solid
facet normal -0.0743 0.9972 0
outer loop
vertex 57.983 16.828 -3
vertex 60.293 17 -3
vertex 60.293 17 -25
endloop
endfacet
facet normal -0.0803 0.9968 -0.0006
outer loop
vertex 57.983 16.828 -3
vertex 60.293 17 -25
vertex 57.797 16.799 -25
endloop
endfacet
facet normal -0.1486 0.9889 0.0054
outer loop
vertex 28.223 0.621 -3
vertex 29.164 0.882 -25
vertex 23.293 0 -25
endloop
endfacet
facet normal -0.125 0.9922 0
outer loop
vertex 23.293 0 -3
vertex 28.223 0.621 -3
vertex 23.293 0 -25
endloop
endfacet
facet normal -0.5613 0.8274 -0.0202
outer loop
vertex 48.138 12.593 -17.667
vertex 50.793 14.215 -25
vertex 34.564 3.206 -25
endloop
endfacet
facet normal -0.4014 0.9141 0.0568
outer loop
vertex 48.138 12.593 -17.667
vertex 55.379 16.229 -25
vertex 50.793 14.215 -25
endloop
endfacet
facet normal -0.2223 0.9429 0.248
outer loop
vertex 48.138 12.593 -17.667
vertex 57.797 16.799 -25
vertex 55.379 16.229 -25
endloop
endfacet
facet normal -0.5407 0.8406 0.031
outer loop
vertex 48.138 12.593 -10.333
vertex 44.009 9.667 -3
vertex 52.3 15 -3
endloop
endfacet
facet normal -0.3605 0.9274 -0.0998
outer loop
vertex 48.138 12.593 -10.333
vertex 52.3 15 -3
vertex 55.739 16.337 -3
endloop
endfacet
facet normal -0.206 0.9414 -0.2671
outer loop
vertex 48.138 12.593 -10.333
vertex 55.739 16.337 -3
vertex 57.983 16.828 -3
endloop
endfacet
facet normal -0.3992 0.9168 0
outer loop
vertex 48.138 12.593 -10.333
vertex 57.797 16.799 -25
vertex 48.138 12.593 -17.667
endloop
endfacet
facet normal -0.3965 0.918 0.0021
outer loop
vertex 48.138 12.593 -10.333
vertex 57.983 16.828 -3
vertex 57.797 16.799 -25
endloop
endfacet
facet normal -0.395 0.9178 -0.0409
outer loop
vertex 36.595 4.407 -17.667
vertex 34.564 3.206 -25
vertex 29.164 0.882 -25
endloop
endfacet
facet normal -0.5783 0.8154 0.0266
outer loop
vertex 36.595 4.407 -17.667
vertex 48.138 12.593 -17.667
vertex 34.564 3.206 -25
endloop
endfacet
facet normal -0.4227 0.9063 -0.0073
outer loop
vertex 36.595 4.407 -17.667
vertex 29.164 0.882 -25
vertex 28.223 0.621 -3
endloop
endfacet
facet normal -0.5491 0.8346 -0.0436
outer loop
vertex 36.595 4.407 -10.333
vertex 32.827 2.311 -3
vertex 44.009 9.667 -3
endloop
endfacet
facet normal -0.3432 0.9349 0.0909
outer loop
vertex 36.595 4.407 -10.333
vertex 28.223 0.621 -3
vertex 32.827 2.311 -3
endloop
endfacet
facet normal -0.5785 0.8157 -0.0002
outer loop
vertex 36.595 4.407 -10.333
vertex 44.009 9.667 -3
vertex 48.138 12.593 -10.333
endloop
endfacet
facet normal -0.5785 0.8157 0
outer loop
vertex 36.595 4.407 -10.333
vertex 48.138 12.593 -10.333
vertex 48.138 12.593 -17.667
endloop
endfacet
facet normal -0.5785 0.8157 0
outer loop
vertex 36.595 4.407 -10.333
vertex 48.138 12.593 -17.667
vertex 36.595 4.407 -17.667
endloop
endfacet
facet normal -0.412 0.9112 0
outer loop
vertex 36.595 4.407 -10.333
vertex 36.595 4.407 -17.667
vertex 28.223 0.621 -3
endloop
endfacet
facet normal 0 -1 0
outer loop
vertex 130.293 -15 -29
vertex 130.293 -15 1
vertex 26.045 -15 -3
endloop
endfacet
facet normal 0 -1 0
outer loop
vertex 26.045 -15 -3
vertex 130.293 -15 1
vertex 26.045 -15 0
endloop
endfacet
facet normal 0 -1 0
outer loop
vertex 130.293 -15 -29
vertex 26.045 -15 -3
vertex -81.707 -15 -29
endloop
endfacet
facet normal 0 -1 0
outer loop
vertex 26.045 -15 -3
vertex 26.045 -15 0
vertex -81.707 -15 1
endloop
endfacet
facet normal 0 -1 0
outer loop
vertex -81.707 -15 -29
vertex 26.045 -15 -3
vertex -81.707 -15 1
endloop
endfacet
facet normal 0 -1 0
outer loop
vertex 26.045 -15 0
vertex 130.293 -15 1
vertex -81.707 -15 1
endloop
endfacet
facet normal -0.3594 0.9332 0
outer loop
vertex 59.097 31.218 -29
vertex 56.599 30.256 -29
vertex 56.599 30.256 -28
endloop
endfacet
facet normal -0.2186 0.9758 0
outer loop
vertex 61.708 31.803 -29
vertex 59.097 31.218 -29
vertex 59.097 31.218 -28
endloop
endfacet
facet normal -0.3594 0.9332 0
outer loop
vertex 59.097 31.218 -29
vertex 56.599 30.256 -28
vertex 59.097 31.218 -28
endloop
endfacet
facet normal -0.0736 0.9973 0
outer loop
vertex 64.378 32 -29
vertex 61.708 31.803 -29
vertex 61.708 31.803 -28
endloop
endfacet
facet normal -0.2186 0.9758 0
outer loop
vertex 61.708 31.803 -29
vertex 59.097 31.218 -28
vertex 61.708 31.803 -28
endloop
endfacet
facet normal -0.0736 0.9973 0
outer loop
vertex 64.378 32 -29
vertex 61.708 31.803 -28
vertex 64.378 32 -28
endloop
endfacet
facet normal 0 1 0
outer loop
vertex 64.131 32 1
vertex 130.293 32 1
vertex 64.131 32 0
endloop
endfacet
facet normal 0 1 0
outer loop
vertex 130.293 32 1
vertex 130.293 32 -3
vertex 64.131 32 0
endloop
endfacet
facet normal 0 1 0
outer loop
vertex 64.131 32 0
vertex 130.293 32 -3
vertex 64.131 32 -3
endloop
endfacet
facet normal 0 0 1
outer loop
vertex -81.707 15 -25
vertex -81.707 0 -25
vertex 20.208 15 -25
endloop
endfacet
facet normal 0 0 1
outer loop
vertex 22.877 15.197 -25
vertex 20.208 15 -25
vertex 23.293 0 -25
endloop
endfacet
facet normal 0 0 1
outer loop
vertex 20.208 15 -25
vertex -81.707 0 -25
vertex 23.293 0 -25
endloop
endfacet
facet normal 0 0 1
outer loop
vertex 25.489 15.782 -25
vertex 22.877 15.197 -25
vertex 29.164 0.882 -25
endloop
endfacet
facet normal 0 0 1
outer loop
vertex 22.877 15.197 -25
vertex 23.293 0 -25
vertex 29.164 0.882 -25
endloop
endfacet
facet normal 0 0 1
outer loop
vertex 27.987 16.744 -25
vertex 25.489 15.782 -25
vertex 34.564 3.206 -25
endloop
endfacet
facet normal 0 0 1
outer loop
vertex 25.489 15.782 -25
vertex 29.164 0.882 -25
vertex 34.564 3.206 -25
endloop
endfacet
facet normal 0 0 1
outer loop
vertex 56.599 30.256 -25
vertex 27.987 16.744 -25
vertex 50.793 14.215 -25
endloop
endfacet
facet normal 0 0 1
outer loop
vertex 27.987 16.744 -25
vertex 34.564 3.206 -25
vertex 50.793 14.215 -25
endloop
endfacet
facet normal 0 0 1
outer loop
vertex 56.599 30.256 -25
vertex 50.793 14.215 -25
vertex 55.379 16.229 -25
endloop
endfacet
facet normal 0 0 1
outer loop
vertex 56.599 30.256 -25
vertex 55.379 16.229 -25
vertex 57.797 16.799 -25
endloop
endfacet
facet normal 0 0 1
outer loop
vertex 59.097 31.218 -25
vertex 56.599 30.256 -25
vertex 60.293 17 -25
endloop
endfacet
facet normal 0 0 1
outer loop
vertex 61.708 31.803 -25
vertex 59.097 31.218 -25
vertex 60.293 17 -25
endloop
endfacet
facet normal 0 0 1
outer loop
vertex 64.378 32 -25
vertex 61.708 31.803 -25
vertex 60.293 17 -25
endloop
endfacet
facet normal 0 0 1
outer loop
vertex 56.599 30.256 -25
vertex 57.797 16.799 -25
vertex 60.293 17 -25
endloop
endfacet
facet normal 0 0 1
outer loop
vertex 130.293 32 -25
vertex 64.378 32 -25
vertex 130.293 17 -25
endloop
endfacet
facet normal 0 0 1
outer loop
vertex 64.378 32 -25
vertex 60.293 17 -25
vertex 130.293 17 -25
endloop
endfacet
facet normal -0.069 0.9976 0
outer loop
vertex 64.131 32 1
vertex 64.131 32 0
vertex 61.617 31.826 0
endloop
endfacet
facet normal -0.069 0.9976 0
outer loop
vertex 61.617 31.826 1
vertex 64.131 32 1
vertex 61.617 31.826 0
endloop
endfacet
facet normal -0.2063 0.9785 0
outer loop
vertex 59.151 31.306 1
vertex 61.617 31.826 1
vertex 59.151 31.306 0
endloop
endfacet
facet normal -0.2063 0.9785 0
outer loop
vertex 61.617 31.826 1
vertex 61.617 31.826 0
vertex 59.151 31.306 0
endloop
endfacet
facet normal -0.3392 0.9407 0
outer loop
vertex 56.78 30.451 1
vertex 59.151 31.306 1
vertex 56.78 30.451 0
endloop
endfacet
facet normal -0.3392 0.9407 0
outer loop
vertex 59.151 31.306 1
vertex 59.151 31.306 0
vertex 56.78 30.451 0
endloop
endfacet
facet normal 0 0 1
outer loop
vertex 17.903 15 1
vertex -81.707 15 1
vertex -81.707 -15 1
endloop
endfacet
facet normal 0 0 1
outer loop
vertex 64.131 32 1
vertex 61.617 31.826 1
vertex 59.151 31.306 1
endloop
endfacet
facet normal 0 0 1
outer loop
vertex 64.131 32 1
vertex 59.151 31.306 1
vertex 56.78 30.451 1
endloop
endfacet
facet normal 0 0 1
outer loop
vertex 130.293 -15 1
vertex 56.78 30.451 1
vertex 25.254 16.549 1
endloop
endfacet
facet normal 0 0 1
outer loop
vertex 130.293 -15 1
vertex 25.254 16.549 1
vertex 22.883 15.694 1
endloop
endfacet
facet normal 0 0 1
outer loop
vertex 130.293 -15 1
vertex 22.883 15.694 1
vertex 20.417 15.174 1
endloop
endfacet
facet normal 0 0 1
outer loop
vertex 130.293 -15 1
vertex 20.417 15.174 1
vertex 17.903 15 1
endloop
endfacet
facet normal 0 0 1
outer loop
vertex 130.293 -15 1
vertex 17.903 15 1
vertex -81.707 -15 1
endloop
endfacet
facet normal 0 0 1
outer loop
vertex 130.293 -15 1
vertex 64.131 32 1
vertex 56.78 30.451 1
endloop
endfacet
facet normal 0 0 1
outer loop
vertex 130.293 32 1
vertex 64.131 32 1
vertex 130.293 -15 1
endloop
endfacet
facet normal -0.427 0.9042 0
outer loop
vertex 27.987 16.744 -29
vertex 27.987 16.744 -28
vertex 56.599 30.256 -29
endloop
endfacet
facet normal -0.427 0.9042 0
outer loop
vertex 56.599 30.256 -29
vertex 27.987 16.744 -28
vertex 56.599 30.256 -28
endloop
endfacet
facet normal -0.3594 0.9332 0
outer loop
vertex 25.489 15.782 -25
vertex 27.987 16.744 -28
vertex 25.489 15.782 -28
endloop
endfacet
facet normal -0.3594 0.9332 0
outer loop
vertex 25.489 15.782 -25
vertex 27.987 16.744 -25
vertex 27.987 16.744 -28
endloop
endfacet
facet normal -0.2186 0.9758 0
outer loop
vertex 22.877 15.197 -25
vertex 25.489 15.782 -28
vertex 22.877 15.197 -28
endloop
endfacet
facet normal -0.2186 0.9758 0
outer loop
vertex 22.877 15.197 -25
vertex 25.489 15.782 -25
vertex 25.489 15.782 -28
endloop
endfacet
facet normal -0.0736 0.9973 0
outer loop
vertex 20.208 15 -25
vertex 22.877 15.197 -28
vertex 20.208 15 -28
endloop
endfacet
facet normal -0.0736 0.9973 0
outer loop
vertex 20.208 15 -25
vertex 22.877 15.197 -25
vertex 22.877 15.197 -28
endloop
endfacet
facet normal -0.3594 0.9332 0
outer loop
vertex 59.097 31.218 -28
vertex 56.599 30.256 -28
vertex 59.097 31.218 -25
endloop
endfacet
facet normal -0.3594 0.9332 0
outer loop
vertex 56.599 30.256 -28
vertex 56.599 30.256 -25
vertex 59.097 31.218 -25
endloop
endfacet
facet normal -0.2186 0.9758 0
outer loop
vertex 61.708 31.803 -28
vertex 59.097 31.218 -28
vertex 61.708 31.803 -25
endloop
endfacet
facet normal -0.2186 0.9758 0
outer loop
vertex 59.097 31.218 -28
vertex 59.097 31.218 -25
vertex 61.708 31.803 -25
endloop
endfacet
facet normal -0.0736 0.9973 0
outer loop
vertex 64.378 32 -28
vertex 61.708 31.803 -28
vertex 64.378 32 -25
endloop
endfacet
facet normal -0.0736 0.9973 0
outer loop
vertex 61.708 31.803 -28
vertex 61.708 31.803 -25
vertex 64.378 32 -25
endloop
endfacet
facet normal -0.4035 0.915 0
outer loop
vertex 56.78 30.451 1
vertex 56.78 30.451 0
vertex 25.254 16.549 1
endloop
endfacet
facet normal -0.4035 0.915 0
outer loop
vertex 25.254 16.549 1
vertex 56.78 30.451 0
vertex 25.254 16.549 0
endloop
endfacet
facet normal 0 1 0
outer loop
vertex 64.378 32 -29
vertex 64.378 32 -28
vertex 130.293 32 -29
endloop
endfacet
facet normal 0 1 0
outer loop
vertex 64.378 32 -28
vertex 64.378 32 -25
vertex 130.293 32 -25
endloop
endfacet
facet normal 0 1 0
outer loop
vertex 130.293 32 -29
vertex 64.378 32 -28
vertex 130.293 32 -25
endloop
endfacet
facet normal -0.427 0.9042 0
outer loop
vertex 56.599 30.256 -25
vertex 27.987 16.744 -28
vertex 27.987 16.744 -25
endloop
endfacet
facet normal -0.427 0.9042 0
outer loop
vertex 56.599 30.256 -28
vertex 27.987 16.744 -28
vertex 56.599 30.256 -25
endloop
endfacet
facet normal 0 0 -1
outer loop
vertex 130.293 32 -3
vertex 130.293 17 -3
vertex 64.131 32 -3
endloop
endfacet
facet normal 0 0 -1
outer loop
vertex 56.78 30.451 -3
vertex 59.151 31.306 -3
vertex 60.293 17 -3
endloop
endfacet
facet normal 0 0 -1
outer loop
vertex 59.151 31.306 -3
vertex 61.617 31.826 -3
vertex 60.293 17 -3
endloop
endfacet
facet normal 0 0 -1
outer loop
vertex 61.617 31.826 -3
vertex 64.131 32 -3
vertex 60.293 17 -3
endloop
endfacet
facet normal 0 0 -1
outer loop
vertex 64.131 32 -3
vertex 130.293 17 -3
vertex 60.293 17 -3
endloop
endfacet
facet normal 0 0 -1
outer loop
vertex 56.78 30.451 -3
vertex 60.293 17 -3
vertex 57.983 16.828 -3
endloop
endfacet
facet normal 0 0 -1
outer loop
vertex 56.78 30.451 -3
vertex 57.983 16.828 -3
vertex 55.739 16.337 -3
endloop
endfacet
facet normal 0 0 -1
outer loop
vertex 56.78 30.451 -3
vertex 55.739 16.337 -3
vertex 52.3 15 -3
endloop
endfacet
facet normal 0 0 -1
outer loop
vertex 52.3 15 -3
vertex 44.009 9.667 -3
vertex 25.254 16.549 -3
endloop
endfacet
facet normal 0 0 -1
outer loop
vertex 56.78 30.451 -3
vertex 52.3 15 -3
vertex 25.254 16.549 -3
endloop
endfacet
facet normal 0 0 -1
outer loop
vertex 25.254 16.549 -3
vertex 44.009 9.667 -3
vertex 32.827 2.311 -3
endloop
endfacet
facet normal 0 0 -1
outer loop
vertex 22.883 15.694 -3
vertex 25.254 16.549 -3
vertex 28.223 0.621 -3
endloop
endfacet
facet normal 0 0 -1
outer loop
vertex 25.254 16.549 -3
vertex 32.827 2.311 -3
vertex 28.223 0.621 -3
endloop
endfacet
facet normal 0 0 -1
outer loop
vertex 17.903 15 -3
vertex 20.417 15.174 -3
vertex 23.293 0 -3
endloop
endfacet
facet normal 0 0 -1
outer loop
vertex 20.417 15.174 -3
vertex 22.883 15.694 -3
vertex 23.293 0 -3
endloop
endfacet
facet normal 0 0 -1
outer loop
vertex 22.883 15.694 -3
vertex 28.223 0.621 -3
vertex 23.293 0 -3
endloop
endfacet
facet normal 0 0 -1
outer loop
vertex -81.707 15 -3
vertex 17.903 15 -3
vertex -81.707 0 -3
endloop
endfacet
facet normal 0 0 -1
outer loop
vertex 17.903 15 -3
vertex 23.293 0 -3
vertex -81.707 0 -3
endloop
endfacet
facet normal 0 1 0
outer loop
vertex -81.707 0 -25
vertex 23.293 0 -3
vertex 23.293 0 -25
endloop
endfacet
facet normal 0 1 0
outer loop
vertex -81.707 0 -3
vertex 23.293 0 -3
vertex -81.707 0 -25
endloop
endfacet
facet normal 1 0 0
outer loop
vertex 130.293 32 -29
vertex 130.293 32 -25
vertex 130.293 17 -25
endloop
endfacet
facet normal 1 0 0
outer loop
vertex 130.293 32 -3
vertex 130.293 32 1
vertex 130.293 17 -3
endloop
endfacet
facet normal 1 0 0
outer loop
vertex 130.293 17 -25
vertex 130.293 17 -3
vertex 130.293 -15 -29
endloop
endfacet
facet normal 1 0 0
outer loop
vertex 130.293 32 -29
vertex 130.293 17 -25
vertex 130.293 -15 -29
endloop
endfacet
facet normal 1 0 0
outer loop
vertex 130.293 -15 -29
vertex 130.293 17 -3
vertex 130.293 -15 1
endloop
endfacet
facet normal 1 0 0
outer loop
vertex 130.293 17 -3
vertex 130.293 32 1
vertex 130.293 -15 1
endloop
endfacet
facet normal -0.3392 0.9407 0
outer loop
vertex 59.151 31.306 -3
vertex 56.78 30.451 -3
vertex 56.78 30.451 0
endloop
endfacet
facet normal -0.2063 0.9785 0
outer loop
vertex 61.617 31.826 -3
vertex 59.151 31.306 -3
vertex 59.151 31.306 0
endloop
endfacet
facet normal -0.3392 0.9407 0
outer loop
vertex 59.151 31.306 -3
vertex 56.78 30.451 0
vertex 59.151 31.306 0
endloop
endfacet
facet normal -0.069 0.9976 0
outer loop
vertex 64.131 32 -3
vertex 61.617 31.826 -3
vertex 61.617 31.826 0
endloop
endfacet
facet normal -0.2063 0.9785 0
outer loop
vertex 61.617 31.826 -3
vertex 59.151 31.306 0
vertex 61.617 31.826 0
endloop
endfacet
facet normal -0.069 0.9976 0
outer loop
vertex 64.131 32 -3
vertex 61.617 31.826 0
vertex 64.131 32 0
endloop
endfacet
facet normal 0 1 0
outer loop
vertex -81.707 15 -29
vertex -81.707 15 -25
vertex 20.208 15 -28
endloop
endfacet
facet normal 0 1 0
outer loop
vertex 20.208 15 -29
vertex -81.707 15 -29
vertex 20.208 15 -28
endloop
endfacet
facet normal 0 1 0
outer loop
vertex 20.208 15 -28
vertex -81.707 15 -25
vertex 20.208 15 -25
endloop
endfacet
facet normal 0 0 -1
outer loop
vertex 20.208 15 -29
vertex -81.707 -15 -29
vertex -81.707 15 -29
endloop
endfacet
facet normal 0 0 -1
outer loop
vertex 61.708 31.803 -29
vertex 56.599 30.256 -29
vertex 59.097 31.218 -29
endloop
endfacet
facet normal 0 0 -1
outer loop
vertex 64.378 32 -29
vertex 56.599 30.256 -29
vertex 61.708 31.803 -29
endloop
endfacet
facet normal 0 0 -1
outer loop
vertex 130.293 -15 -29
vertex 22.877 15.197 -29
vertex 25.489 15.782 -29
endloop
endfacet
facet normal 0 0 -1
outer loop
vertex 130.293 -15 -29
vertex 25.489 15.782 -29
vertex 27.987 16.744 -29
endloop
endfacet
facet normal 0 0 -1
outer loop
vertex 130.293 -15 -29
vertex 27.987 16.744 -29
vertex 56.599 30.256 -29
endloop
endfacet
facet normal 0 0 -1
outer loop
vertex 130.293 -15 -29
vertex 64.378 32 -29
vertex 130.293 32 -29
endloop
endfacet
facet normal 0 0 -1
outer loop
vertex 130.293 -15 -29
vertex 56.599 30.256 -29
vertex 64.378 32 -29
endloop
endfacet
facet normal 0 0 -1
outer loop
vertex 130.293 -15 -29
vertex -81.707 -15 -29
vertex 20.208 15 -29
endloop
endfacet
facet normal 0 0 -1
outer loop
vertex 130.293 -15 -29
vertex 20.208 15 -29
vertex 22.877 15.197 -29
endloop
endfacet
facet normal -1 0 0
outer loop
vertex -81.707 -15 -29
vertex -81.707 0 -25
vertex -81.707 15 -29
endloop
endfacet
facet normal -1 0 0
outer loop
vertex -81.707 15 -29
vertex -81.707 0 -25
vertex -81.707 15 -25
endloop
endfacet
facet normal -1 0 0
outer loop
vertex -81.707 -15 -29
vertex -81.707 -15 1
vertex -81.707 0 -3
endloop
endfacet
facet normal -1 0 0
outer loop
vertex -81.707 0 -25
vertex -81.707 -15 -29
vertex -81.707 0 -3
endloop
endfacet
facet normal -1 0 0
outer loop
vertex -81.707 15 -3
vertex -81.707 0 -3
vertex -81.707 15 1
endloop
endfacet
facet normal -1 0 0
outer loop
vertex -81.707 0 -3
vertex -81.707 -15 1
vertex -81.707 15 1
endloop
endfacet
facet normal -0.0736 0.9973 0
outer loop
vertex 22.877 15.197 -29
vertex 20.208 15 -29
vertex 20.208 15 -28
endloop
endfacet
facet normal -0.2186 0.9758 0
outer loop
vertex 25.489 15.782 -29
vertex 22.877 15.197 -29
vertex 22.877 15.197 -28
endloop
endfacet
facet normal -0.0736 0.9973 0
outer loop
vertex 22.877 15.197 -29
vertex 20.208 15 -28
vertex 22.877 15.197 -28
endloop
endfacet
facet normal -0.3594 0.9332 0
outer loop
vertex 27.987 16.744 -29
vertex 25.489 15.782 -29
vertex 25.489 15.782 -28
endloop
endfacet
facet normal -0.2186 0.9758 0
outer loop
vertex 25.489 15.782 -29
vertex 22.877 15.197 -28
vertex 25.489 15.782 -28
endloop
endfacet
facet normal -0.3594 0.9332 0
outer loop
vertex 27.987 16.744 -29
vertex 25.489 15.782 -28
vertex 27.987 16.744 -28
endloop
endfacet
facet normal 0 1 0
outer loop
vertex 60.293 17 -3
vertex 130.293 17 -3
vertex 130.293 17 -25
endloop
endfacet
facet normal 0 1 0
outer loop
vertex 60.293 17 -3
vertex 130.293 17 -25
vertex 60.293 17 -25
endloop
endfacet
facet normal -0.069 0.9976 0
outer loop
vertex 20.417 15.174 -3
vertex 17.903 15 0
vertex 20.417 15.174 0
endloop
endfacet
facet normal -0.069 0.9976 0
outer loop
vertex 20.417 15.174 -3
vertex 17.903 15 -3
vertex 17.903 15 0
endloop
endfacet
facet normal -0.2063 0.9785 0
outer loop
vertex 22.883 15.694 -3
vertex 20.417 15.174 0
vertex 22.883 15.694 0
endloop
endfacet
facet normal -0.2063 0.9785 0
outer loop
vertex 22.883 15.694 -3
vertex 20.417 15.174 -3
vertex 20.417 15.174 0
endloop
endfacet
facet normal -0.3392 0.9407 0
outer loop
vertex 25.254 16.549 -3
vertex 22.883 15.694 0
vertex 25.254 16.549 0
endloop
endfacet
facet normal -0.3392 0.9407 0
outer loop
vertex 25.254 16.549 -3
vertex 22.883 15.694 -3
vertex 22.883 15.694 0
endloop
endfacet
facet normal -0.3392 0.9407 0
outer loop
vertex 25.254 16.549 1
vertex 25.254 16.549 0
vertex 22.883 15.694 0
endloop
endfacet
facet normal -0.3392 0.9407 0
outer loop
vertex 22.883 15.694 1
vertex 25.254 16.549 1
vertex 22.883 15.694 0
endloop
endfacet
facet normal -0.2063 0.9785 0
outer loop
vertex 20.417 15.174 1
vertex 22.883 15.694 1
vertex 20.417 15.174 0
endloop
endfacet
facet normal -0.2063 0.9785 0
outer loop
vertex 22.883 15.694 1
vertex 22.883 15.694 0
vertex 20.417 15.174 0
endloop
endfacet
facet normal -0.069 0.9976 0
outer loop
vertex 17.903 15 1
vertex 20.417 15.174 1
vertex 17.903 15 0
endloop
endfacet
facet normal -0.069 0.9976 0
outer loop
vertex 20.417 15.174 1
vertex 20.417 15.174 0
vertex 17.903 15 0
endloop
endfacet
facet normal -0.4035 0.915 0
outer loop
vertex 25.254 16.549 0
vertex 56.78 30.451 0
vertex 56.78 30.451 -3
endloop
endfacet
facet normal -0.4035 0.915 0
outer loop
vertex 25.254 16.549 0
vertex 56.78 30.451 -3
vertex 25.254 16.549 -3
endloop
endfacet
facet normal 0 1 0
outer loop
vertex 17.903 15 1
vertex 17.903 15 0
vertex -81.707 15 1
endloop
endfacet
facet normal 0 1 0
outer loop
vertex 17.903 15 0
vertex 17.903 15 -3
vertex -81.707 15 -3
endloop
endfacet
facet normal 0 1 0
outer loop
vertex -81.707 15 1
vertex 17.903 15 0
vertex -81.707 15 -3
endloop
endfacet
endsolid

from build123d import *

# Parameters (mm, degrees)
F1_DEPTH  = 28
F2_W      = 211.909
F2_H      = 3
F3_DEPTH  = 15
F4_W      = 70
F4_H      = 3
F5_DEPTH  = 15
F7_DEPTH  = 3
F8_R      = 18.2181512029
F10_DEPTH = 3
F11_R     = 18.218
F13_DEPTH = 1
F15_DEPTH = 1


with BuildPart() as f1:
    # F0 (on Top) → F1 (new body)
    with BuildSketch(Plane.XY):
        with BuildLine():
            Line((23.2926856095, 0), (-81.7073143905, 0))
            Line((-81.7073143905, 0), (-81.7073143905, -15))
            Line((-81.7073143905, -15), (130.2926856095, -15))
            Line((130.2926856095, -15), (130.2926856095, 17))
            Line((130.2926856095, 17), (60.2926856095, 17))
            add(Edge.make_bspline(
                [(60.2926856095, 17), (47.0403235396, 17), (38.2657825675, 0), (23.2926856095, 0)],
                knots=[0, 0, 0, 0, 40.718546143, 40.718546143, 40.718546143, 40.718546143], degree=3))
        make_face()
    extrude(amount=-F1_DEPTH)

    # F2 (on face) → F3 (join)
    with BuildSketch(Plane(origin=(0, 0, 0), x_dir=(-1, 0, 0), z_dir=(0, 1, 0))):
        with Locations((-24.2471856095, -1.5)):
            Rectangle(F2_W, F2_H)
        with Locations((-24.2471856095, -26.5)):
            Rectangle(F2_W, F2_H)
    extrude(amount=F3_DEPTH)

    # F4 (on face) → F5 (join)
    with BuildSketch(Plane(origin=(0, 17, 0), x_dir=(-1, 0, 0), z_dir=(0, 1, 0))):
        with Locations((-95.2926856095, -26.5)):
            Rectangle(F4_W, F4_H)
        with Locations((-95.2926856095, -1.5)):
            Rectangle(F4_W, F4_H)
    extrude(amount=F5_DEPTH)

    # F6 (on face) → F7 (join)
    with BuildSketch(Plane.XY):
        Polygon((64.7905170918, 0), (60.2926856095, 32), (21.7418372631, 15), (26.0446537286, -15), align=None)
    extrude(amount=-F7_DEPTH)

    # F8
    f8_edges = [f1.edges().sort_by_distance(p)[0] for p in [
        (60.292686, 32, -1.5),
        (21.741837, 15, -1.5),
    ]]
    fillet(f8_edges, radius=F8_R)

    # F9 (on face) → F10 (join)
    with BuildSketch(Plane(origin=(0, 0, -28), x_dir=(1, 0, 0), z_dir=(0, 0, -1))):
        Polygon((24.2926856095, -15), (60.2926856095, -32), (60.2926856095, -17), (52.3001670697, -15), align=None)
    extrude(amount=-F10_DEPTH)

    # F11
    f11_edges = [f1.edges().sort_by_distance(p)[0] for p in [
        (60.292686, 32, -26.5),
        (24.292686, 15, -26.5),
    ]]
    fillet(f11_edges, radius=F11_R)

    # F12 (on face) → F13 (join)
    with BuildSketch(Plane.XY):
        with BuildLine():
            Line((130.2926856095, -15), (130.2926856095, 32))
            Line((130.2926856095, 32), (64.1312427554, 32))
            ThreePointArc((64.1312427554, 32), (60.3751547463, 31.6085937641), (56.7804614092, 30.4511933209))
            Line((56.7804614092, 30.4511933209), (25.2540614634, 16.5488066791))
            ThreePointArc((25.2540614634, 16.5488066791), (21.6593681263, 15.3914062359), (17.9032801172, 15))
            Line((17.9032801172, 15), (-81.7073143905, 15))
            Line((-81.7073143905, 15), (-81.7073143905, -15))
            Line((-81.7073143905, -15), (26.0446537286, -15))
            Line((26.0446537286, -15), (130.2926856095, -15))
        make_face()
    extrude(amount=F13_DEPTH)

    # F14 (on face) → F15 (join)
    with BuildSketch(Plane(origin=(0, 0, -28), x_dir=(1, 0, 0), z_dir=(0, 0, -1))):
        with BuildLine():
            ThreePointArc((20.2075043569, -15), (24.1936958703, -15.4414479941), (27.9867052288, -16.7443981536))
            Line((27.9867052288, -16.7443981536), (56.5986659901, -30.2556018464))
            ThreePointArc((56.5986659901, -30.2556018464), (60.3916753487, -31.5585520059), (64.3778668621, -32))
            Line((64.3778668621, -32), (130.2926856095, -32))
            Line((130.2926856095, -32), (130.2926856095, 15))
            Line((130.2926856095, 15), (-81.7073143905, 15))
            Line((-81.7073143905, 15), (-81.7073143905, -15))
            Line((-81.7073143905, -15), (20.2075043569, -15))
        make_face()
    extrude(amount=F15_DEPTH)


solid = f1.part
